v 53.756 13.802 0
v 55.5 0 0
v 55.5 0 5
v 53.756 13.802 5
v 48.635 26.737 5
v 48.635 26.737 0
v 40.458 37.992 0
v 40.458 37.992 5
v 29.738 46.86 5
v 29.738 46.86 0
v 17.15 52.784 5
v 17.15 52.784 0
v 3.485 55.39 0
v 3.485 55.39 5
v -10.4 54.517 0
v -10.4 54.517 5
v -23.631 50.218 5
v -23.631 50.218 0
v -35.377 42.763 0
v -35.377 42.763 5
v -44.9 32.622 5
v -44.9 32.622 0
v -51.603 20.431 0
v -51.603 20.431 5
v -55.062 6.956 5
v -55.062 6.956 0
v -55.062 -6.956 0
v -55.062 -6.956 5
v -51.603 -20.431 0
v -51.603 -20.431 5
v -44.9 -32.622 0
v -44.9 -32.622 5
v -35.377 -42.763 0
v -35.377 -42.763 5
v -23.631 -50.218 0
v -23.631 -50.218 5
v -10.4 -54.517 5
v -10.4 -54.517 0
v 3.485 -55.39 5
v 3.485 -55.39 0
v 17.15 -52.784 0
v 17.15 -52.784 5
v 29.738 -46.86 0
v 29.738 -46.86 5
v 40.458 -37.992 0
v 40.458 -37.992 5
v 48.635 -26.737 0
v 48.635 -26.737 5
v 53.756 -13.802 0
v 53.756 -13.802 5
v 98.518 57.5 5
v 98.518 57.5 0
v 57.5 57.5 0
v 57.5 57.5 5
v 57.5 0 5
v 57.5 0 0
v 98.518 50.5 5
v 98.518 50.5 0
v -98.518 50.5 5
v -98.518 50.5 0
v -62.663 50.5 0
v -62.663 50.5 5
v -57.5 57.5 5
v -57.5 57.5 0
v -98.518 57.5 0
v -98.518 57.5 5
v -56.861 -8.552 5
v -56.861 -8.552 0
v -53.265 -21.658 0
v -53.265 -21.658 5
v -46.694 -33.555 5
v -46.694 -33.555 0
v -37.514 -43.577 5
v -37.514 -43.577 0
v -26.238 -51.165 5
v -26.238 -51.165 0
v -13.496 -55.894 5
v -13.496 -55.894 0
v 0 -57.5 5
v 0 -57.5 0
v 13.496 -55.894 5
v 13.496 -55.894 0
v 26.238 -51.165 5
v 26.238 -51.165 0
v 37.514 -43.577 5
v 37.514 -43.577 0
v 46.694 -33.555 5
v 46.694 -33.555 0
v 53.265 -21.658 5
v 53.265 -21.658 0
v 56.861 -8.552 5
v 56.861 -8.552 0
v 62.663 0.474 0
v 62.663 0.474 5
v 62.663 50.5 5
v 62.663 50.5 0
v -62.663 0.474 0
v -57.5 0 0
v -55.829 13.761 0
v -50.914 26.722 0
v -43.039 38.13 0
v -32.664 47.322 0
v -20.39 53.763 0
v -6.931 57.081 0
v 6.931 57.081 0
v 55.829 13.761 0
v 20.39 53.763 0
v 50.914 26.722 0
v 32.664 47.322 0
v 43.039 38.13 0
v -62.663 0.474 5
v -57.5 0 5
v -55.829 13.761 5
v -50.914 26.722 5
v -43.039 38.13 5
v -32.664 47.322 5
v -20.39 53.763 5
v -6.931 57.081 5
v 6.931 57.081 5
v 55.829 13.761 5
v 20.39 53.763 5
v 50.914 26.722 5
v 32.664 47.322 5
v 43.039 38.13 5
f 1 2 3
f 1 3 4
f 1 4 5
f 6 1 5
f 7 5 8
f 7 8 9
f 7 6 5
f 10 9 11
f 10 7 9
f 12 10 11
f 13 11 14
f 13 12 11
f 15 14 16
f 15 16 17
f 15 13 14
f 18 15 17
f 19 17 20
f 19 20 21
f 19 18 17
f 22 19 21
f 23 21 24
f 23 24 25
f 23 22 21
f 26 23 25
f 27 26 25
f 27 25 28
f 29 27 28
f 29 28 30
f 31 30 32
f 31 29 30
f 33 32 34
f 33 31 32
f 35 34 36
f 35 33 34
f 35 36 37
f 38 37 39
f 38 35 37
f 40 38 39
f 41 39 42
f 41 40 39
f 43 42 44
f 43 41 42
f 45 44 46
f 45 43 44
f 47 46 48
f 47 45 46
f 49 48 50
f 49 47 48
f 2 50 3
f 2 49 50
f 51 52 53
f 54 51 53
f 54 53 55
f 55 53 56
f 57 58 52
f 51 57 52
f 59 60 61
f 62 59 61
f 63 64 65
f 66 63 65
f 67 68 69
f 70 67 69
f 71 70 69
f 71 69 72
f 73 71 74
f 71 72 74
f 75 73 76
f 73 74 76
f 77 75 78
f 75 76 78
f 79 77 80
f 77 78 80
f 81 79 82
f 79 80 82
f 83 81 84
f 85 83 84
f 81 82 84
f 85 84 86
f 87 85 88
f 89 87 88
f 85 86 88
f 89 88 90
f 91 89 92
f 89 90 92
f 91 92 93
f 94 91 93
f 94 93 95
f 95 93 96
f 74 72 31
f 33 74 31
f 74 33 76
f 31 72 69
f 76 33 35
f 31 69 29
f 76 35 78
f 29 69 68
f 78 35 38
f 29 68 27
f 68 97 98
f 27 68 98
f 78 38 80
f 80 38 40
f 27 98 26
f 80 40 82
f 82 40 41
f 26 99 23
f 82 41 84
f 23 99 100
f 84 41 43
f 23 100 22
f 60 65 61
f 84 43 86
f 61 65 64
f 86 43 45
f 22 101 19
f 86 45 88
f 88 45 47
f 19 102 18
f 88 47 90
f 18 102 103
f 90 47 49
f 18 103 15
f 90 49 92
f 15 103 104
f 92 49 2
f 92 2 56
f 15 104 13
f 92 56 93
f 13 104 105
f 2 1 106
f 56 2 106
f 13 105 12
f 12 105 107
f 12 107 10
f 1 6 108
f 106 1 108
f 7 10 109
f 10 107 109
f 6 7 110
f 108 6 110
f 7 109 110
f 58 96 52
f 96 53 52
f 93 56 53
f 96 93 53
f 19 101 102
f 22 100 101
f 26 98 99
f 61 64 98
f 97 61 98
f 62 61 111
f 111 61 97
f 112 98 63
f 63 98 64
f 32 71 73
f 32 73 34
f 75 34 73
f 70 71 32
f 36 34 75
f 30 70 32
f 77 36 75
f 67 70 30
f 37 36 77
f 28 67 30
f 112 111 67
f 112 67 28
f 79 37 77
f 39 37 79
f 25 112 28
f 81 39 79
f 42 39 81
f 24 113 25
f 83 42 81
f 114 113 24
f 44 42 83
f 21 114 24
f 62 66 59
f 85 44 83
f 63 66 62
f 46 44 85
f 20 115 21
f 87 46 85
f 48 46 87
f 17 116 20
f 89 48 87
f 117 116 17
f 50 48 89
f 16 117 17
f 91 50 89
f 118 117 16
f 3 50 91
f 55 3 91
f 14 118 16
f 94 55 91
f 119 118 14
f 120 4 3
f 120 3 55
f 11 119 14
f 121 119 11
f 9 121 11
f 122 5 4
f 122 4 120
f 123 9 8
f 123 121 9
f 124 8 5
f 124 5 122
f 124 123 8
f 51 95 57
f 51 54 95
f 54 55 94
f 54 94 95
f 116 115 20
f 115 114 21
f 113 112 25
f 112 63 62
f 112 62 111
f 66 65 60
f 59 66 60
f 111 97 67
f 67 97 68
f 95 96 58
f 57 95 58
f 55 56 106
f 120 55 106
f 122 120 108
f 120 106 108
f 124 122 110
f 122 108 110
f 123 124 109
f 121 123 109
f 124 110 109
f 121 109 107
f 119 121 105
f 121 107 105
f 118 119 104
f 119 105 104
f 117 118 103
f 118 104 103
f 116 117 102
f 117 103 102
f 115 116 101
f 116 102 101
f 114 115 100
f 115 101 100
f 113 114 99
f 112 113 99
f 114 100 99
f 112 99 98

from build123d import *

# Parameters (mm, degrees)
SKETCH1_R           = 57.5
SKETCH1_R_2         = 55.5
BOSS_EXTRUDE1_DEPTH = 5


with BuildPart() as part:
    # Sketch1 → Boss-Extrude1 (new body)
    # profile 1 of 3: a face of its own
    with BuildSketch(Plane.XY):
        with BuildLine():
            ThreePointArc((-56.86052693, -8.551635942), (-57.33990887, -4.287755914), (-57.5, 0))
            Line((-57.5, 0), (-57.5, 57.5))
            Line((-57.5, 57.5), (-98.518106022, 57.5))
            Line((-98.518106022, 57.5), (-98.518106022, 50.5))
            Line((-98.518106022, 50.5), (-62.662833113, 50.5))
            Line((-62.662833113, 50.5), (-62.662833113, 0.474482067))
            Line((-62.662833113, 0.474482067), (-56.86052693, -8.551635942))
        make_face()
    # profile 2 of 3: a face of its own
    with BuildSketch(Plane.XY):
        Circle(SKETCH1_R)
        Circle(SKETCH1_R_2, mode=Mode.SUBTRACT)
    # profile 3 of 3: a face of its own
    with BuildSketch(Plane.XY):
        with BuildLine():
            Line((57.5, 57.5), (57.5, 0))
            ThreePointArc((57.5, 0), (57.33990887, -4.287755914), (56.86052693, -8.551635942))
            Line((56.86052693, -8.551635942), (62.662833113, 0.474482067))
            Line((62.662833113, 0.474482067), (62.662833113, 50.5))
            Line((62.662833113, 50.5), (98.518106022, 50.5))
            Line((98.518106022, 50.5), (98.518106022, 57.5))
            Line((98.518106022, 57.5), (57.5, 57.5))
        make_face()
    extrude(amount=BOSS_EXTRUDE1_DEPTH)


solid = part.part
